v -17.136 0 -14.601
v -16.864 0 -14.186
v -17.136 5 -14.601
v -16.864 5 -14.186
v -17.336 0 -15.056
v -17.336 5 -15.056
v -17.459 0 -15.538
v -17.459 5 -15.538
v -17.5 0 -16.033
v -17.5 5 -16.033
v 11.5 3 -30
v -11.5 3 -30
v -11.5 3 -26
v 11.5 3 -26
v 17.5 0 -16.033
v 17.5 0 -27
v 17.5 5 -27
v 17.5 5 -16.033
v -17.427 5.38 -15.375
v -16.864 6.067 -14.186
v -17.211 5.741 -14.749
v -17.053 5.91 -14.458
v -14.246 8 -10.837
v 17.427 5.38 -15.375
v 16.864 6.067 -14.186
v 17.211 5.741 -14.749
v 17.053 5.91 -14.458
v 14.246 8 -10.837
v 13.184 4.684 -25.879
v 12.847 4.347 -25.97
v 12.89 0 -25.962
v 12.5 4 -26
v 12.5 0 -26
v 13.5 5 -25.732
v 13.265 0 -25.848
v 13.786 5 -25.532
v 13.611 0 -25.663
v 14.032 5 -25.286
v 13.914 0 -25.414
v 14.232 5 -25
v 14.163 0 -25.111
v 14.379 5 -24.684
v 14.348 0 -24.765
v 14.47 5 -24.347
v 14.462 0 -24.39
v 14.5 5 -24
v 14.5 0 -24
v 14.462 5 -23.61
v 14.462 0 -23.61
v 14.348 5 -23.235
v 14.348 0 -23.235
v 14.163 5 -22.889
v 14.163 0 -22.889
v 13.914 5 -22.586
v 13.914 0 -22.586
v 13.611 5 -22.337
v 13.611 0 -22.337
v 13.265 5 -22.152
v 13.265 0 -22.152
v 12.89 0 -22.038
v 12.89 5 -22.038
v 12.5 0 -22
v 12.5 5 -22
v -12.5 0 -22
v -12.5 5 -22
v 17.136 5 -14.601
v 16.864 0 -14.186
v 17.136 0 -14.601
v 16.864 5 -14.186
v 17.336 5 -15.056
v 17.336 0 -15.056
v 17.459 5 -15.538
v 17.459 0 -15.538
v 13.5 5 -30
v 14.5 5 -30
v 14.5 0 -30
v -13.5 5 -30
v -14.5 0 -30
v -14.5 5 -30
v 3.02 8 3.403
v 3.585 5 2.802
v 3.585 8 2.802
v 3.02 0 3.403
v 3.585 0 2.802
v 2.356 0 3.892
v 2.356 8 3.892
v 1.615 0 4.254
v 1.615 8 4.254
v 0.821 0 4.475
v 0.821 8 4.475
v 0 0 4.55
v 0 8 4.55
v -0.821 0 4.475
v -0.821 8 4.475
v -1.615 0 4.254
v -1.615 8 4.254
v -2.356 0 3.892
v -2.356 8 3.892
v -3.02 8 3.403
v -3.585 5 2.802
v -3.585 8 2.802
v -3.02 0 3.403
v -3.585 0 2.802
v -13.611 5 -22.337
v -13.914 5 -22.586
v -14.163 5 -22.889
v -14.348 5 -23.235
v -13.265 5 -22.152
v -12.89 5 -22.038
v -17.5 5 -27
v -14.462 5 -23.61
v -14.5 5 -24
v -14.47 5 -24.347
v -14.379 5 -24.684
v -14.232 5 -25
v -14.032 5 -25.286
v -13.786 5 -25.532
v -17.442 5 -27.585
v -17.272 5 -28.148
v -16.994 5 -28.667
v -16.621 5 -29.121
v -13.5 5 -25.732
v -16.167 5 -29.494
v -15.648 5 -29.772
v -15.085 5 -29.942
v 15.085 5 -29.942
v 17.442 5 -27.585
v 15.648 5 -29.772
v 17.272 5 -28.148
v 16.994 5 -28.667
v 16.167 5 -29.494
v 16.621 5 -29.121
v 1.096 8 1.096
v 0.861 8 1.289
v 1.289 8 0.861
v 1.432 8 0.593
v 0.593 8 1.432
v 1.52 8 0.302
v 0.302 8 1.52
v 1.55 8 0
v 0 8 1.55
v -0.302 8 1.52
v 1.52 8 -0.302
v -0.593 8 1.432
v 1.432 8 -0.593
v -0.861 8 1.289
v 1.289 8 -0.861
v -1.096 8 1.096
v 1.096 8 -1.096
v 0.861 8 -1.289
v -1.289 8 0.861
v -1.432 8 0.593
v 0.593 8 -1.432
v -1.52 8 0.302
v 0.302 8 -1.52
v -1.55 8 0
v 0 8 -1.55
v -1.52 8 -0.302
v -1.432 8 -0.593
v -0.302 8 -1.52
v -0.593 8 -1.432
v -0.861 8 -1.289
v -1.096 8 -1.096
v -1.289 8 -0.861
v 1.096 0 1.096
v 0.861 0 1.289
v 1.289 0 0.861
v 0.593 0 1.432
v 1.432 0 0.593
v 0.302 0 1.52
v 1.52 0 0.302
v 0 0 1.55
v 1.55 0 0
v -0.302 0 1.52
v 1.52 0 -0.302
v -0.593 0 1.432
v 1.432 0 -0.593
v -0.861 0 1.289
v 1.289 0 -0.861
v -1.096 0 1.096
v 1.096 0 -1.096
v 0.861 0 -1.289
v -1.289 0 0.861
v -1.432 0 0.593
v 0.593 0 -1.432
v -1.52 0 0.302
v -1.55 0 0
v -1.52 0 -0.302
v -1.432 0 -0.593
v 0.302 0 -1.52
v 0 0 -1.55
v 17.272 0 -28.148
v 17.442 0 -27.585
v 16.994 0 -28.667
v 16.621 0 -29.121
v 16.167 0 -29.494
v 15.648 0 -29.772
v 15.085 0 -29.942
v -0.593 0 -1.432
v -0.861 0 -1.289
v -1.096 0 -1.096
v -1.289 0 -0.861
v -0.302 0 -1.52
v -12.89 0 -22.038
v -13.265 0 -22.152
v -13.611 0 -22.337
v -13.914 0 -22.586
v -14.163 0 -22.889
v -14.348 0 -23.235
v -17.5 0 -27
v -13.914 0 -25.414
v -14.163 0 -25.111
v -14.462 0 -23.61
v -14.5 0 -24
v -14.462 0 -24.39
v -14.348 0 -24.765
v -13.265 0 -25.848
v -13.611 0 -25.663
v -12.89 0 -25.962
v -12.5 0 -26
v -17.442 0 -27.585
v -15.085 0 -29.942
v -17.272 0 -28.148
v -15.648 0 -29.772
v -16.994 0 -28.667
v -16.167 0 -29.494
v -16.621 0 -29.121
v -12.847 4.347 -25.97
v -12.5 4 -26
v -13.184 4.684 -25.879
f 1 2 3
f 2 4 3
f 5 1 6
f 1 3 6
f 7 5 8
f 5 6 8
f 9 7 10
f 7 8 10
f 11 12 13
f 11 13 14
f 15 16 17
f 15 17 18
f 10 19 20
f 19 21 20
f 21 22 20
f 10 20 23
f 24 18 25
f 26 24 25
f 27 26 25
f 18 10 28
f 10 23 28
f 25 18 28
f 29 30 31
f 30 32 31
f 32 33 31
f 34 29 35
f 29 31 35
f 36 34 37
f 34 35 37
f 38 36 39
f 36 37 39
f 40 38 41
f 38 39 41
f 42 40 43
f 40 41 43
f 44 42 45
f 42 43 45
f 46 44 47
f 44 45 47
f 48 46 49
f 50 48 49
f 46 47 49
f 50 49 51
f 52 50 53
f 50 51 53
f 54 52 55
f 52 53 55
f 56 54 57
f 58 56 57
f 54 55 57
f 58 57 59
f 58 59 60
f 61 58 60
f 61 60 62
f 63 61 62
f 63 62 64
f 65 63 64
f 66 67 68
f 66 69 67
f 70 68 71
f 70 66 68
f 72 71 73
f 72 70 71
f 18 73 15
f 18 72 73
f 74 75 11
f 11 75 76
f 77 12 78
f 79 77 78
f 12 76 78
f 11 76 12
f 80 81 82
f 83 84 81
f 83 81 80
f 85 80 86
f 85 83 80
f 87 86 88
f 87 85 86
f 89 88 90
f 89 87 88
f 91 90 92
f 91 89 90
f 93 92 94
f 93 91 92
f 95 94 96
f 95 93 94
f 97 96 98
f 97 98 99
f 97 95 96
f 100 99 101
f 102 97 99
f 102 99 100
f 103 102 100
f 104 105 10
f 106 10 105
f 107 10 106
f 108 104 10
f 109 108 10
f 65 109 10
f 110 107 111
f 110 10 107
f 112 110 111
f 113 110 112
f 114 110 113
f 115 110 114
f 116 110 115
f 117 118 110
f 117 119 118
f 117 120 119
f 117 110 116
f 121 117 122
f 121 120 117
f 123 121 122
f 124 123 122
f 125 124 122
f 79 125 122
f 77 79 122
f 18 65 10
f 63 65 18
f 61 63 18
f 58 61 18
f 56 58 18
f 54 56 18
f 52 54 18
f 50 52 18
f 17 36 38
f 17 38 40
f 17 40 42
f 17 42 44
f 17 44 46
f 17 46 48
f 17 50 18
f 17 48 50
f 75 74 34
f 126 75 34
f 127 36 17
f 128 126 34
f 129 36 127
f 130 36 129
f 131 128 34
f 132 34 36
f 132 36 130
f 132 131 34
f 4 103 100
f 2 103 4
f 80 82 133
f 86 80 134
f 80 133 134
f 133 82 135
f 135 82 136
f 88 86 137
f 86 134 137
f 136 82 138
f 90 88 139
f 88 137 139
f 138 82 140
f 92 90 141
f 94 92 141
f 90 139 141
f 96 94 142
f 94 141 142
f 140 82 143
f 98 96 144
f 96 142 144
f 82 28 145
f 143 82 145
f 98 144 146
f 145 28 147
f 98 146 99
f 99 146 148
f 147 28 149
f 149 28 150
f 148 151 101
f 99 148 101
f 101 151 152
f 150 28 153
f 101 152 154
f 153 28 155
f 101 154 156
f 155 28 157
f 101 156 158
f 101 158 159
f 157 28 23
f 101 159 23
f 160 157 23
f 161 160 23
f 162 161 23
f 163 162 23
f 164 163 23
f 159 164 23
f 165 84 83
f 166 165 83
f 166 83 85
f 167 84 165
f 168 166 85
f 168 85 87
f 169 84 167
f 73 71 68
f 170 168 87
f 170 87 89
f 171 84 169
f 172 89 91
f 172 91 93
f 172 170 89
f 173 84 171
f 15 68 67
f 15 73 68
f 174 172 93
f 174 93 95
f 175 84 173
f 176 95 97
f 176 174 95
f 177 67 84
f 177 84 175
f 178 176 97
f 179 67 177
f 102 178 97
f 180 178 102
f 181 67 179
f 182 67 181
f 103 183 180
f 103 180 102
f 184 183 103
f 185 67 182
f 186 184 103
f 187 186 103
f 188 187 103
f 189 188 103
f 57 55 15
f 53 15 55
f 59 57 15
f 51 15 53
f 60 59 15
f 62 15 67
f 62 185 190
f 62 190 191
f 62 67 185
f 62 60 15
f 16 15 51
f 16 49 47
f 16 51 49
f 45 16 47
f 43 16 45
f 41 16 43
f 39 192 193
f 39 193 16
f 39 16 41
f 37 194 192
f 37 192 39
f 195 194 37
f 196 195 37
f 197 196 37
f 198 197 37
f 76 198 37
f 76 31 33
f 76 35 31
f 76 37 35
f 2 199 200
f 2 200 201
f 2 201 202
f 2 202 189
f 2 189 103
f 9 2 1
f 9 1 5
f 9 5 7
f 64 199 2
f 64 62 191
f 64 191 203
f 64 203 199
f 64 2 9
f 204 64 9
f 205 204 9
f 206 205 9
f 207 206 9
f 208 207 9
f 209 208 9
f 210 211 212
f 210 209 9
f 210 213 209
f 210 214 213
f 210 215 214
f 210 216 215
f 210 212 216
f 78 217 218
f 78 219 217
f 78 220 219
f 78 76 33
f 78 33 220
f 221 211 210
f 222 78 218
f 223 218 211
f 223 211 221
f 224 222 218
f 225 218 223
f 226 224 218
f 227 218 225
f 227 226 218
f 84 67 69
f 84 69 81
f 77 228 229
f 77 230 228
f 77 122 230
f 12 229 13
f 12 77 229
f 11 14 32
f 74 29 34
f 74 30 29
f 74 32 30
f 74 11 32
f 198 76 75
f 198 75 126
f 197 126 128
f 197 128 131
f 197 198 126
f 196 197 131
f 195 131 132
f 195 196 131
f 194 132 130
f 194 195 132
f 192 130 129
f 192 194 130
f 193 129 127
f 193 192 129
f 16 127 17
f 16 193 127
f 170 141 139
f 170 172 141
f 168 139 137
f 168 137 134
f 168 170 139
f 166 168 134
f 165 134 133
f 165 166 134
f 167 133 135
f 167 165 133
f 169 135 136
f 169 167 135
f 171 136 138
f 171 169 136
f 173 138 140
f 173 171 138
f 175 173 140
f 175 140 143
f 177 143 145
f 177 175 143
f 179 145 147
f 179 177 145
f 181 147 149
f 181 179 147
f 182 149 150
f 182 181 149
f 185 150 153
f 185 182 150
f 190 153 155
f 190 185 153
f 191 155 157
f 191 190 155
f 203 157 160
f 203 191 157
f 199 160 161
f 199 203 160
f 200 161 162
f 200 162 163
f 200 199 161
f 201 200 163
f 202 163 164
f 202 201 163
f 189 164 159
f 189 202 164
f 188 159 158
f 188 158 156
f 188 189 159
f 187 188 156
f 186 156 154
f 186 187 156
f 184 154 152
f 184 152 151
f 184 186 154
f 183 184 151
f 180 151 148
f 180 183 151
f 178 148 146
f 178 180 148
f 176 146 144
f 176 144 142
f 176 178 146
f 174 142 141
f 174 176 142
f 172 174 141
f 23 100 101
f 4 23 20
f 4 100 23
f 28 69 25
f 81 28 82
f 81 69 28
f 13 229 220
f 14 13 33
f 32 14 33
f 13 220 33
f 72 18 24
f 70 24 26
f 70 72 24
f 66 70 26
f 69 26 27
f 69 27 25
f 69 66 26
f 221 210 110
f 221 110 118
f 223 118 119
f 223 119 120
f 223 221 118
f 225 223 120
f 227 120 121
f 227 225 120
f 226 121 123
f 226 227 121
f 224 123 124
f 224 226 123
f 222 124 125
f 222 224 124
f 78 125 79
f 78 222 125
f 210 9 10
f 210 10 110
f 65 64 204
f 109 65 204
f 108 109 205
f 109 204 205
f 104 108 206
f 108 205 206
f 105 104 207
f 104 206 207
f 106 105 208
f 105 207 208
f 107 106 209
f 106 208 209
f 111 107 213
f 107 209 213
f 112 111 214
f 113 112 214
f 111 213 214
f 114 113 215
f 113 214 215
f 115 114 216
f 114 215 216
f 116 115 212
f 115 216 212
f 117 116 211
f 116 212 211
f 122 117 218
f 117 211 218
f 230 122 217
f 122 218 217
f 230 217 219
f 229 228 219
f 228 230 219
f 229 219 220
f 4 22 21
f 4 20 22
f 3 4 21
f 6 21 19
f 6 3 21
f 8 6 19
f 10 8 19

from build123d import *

# Parameters (mm, degrees)
SKETCH1_R           = 1.55
BOSS_EXTRUDE1_DEPTH = 5
SKETCH2_W           = 29
SKETCH2_H           = 6
CUT_EXTRUDE1_DEPTH  = 2
CHAMFER1_START      = 3
CHAMFER1_DEPTH      = 2
CHAMFER1_START_2    = -30
CHAMFER1_2_DEPTH    = 6
FILLET1_R           = 3
SKETCH3_R           = 1.55
BOSS_EXTRUDE2_DEPTH = 3
CHAMFER2_SIZE2      = 5.196152423
CHAMFER2_SIZE       = 3


with BuildPart() as part:
    # Sketch1 → Boss-Extrude1 (new body)
    with BuildSketch(Plane(origin=(0, 0, 0), x_dir=(1, 0, 0), z_dir=(0, 1, 0))):
        with BuildLine():
            Line((-3.584795955, -2.802095281), (-17.5, 15))
            Line((-17.5, 15), (-17.5, 27))
            ThreePointArc((-17.5, 27), (-16.621320344, 29.121320344), (-14.5, 30))
            Line((-14.5, 30), (14.5, 30))
            ThreePointArc((14.5, 30), (16.621320344, 29.121320344), (17.5, 27))
            Line((17.5, 27), (17.5, 15))
            Line((17.5, 15), (3.584795955, -2.802095281))
            ThreePointArc((3.584795955, -2.802095281), (0, -4.55), (-3.584795955, -2.802095281))
        make_face()
        with Locations(Location((0, 0, 0), (0, 0, 270))):
            Circle(SKETCH1_R, mode=Mode.SUBTRACT)
        with BuildLine():
            Line((12.5, 22), (-12.5, 22))
            ThreePointArc((-12.5, 22), (-14.5, 24), (-12.5, 26))
            Line((-12.5, 26), (12.5, 26))
            ThreePointArc((12.5, 26), (14.5, 24), (12.5, 22))
        make_face(mode=Mode.SUBTRACT)
    extrude(amount=BOSS_EXTRUDE1_DEPTH)

    # Sketch2 → Cut-Extrude1 (cut)
    with BuildSketch(Plane(origin=(0, 5, 0), x_dir=(1, 0, 0), z_dir=(0, 1, 0))):
        with Locations((0, 27)):
            Rectangle(SKETCH2_W, SKETCH2_H)
    extrude(amount=-CUT_EXTRUDE1_DEPTH, mode=Mode.SUBTRACT)

    # Chamfer1: read off the stored shape, not the designer's step
    # Chamfer1 outline → Chamfer1 (add)
    with BuildSketch(Plane(origin=(0, 0, 0), x_dir=(1, 0, 0), z_dir=(0, 1, 0)).offset(CHAMFER1_START)):
        with BuildLine():
            Line((-12.5, 26), (12.5, 26))
            ThreePointArc((12.5, 26), (13.914213562, 25.414213562), (14.5, 24))
            Line((14.5, 24), (14.5, 30))
            Line((14.5, 30), (-14.5, 30))
            Line((-14.5, 30), (-14.5, 24))
            ThreePointArc((-14.5, 24), (-13.914213562, 25.414213562), (-12.5, 26))
        make_face()
    extrude(amount=CHAMFER1_DEPTH)

    # Chamfer1 2 outline → Chamfer1 2 (cut)
    with BuildSketch(Plane.XY.offset(CHAMFER1_START_2)):
        Polygon((-13.5, 5), (-11.5, 3), (11.5, 3), (13.5, 5), align=None)
    extrude(amount=CHAMFER1_2_DEPTH, mode=Mode.SUBTRACT)

    # Fillet1
    fillet1_edges = [part.edges().sort_by_distance(p)[0] for p in [
        (-17.5, 2.5, -15),
        (17.5, 2.5, -15),
    ]]
    fillet(fillet1_edges, radius=FILLET1_R)

    # Sketch3 → Boss-Extrude2 (add)
    with BuildSketch(Plane(origin=(0, 5, 0), x_dir=(1, 0, 0), z_dir=(0, 1, 0))):
        with BuildLine():
            Line((-17.5, 16.033373903), (17.5, 16.033373903))
            ThreePointArc((17.5, 16.033373903), (17.33644189, 15.056338894), (16.863601728, 14.185838553))
            Line((16.863601728, 14.185838553), (3.584795955, -2.802095281))
            ThreePointArc((3.584795955, -2.802095281), (0, -4.55), (-3.584795955, -2.802095281))
            Line((-3.584795955, -2.802095281), (-16.863601728, 14.185838553))
            ThreePointArc((-16.863601728, 14.185838553), (-17.33644189, 15.056338894), (-17.5, 16.033373903))
        make_face()
        with Locations(Location((0, 0, 0), (0, 0, 270))):
            Circle(SKETCH3_R, mode=Mode.SUBTRACT)
    extrude(amount=BOSS_EXTRUDE2_DEPTH)

    # Chamfer2
    chamfer2_edges = [part.edges().sort_by_distance(p)[0] for p in [
        (0, 8, -16.033373903),
    ]]
    chamfer2_side = [part.faces().sort_by_distance(p)[0] for p in [
        (0, 7.94, -16.033373903),
    ]]
    chamfer(chamfer2_edges, length=CHAMFER2_SIZE - 0.0001, length2=CHAMFER2_SIZE2 - 0.0001, reference=chamfer2_side[0])  # a hair under: the kernel refuses the full size


solid = part.part
